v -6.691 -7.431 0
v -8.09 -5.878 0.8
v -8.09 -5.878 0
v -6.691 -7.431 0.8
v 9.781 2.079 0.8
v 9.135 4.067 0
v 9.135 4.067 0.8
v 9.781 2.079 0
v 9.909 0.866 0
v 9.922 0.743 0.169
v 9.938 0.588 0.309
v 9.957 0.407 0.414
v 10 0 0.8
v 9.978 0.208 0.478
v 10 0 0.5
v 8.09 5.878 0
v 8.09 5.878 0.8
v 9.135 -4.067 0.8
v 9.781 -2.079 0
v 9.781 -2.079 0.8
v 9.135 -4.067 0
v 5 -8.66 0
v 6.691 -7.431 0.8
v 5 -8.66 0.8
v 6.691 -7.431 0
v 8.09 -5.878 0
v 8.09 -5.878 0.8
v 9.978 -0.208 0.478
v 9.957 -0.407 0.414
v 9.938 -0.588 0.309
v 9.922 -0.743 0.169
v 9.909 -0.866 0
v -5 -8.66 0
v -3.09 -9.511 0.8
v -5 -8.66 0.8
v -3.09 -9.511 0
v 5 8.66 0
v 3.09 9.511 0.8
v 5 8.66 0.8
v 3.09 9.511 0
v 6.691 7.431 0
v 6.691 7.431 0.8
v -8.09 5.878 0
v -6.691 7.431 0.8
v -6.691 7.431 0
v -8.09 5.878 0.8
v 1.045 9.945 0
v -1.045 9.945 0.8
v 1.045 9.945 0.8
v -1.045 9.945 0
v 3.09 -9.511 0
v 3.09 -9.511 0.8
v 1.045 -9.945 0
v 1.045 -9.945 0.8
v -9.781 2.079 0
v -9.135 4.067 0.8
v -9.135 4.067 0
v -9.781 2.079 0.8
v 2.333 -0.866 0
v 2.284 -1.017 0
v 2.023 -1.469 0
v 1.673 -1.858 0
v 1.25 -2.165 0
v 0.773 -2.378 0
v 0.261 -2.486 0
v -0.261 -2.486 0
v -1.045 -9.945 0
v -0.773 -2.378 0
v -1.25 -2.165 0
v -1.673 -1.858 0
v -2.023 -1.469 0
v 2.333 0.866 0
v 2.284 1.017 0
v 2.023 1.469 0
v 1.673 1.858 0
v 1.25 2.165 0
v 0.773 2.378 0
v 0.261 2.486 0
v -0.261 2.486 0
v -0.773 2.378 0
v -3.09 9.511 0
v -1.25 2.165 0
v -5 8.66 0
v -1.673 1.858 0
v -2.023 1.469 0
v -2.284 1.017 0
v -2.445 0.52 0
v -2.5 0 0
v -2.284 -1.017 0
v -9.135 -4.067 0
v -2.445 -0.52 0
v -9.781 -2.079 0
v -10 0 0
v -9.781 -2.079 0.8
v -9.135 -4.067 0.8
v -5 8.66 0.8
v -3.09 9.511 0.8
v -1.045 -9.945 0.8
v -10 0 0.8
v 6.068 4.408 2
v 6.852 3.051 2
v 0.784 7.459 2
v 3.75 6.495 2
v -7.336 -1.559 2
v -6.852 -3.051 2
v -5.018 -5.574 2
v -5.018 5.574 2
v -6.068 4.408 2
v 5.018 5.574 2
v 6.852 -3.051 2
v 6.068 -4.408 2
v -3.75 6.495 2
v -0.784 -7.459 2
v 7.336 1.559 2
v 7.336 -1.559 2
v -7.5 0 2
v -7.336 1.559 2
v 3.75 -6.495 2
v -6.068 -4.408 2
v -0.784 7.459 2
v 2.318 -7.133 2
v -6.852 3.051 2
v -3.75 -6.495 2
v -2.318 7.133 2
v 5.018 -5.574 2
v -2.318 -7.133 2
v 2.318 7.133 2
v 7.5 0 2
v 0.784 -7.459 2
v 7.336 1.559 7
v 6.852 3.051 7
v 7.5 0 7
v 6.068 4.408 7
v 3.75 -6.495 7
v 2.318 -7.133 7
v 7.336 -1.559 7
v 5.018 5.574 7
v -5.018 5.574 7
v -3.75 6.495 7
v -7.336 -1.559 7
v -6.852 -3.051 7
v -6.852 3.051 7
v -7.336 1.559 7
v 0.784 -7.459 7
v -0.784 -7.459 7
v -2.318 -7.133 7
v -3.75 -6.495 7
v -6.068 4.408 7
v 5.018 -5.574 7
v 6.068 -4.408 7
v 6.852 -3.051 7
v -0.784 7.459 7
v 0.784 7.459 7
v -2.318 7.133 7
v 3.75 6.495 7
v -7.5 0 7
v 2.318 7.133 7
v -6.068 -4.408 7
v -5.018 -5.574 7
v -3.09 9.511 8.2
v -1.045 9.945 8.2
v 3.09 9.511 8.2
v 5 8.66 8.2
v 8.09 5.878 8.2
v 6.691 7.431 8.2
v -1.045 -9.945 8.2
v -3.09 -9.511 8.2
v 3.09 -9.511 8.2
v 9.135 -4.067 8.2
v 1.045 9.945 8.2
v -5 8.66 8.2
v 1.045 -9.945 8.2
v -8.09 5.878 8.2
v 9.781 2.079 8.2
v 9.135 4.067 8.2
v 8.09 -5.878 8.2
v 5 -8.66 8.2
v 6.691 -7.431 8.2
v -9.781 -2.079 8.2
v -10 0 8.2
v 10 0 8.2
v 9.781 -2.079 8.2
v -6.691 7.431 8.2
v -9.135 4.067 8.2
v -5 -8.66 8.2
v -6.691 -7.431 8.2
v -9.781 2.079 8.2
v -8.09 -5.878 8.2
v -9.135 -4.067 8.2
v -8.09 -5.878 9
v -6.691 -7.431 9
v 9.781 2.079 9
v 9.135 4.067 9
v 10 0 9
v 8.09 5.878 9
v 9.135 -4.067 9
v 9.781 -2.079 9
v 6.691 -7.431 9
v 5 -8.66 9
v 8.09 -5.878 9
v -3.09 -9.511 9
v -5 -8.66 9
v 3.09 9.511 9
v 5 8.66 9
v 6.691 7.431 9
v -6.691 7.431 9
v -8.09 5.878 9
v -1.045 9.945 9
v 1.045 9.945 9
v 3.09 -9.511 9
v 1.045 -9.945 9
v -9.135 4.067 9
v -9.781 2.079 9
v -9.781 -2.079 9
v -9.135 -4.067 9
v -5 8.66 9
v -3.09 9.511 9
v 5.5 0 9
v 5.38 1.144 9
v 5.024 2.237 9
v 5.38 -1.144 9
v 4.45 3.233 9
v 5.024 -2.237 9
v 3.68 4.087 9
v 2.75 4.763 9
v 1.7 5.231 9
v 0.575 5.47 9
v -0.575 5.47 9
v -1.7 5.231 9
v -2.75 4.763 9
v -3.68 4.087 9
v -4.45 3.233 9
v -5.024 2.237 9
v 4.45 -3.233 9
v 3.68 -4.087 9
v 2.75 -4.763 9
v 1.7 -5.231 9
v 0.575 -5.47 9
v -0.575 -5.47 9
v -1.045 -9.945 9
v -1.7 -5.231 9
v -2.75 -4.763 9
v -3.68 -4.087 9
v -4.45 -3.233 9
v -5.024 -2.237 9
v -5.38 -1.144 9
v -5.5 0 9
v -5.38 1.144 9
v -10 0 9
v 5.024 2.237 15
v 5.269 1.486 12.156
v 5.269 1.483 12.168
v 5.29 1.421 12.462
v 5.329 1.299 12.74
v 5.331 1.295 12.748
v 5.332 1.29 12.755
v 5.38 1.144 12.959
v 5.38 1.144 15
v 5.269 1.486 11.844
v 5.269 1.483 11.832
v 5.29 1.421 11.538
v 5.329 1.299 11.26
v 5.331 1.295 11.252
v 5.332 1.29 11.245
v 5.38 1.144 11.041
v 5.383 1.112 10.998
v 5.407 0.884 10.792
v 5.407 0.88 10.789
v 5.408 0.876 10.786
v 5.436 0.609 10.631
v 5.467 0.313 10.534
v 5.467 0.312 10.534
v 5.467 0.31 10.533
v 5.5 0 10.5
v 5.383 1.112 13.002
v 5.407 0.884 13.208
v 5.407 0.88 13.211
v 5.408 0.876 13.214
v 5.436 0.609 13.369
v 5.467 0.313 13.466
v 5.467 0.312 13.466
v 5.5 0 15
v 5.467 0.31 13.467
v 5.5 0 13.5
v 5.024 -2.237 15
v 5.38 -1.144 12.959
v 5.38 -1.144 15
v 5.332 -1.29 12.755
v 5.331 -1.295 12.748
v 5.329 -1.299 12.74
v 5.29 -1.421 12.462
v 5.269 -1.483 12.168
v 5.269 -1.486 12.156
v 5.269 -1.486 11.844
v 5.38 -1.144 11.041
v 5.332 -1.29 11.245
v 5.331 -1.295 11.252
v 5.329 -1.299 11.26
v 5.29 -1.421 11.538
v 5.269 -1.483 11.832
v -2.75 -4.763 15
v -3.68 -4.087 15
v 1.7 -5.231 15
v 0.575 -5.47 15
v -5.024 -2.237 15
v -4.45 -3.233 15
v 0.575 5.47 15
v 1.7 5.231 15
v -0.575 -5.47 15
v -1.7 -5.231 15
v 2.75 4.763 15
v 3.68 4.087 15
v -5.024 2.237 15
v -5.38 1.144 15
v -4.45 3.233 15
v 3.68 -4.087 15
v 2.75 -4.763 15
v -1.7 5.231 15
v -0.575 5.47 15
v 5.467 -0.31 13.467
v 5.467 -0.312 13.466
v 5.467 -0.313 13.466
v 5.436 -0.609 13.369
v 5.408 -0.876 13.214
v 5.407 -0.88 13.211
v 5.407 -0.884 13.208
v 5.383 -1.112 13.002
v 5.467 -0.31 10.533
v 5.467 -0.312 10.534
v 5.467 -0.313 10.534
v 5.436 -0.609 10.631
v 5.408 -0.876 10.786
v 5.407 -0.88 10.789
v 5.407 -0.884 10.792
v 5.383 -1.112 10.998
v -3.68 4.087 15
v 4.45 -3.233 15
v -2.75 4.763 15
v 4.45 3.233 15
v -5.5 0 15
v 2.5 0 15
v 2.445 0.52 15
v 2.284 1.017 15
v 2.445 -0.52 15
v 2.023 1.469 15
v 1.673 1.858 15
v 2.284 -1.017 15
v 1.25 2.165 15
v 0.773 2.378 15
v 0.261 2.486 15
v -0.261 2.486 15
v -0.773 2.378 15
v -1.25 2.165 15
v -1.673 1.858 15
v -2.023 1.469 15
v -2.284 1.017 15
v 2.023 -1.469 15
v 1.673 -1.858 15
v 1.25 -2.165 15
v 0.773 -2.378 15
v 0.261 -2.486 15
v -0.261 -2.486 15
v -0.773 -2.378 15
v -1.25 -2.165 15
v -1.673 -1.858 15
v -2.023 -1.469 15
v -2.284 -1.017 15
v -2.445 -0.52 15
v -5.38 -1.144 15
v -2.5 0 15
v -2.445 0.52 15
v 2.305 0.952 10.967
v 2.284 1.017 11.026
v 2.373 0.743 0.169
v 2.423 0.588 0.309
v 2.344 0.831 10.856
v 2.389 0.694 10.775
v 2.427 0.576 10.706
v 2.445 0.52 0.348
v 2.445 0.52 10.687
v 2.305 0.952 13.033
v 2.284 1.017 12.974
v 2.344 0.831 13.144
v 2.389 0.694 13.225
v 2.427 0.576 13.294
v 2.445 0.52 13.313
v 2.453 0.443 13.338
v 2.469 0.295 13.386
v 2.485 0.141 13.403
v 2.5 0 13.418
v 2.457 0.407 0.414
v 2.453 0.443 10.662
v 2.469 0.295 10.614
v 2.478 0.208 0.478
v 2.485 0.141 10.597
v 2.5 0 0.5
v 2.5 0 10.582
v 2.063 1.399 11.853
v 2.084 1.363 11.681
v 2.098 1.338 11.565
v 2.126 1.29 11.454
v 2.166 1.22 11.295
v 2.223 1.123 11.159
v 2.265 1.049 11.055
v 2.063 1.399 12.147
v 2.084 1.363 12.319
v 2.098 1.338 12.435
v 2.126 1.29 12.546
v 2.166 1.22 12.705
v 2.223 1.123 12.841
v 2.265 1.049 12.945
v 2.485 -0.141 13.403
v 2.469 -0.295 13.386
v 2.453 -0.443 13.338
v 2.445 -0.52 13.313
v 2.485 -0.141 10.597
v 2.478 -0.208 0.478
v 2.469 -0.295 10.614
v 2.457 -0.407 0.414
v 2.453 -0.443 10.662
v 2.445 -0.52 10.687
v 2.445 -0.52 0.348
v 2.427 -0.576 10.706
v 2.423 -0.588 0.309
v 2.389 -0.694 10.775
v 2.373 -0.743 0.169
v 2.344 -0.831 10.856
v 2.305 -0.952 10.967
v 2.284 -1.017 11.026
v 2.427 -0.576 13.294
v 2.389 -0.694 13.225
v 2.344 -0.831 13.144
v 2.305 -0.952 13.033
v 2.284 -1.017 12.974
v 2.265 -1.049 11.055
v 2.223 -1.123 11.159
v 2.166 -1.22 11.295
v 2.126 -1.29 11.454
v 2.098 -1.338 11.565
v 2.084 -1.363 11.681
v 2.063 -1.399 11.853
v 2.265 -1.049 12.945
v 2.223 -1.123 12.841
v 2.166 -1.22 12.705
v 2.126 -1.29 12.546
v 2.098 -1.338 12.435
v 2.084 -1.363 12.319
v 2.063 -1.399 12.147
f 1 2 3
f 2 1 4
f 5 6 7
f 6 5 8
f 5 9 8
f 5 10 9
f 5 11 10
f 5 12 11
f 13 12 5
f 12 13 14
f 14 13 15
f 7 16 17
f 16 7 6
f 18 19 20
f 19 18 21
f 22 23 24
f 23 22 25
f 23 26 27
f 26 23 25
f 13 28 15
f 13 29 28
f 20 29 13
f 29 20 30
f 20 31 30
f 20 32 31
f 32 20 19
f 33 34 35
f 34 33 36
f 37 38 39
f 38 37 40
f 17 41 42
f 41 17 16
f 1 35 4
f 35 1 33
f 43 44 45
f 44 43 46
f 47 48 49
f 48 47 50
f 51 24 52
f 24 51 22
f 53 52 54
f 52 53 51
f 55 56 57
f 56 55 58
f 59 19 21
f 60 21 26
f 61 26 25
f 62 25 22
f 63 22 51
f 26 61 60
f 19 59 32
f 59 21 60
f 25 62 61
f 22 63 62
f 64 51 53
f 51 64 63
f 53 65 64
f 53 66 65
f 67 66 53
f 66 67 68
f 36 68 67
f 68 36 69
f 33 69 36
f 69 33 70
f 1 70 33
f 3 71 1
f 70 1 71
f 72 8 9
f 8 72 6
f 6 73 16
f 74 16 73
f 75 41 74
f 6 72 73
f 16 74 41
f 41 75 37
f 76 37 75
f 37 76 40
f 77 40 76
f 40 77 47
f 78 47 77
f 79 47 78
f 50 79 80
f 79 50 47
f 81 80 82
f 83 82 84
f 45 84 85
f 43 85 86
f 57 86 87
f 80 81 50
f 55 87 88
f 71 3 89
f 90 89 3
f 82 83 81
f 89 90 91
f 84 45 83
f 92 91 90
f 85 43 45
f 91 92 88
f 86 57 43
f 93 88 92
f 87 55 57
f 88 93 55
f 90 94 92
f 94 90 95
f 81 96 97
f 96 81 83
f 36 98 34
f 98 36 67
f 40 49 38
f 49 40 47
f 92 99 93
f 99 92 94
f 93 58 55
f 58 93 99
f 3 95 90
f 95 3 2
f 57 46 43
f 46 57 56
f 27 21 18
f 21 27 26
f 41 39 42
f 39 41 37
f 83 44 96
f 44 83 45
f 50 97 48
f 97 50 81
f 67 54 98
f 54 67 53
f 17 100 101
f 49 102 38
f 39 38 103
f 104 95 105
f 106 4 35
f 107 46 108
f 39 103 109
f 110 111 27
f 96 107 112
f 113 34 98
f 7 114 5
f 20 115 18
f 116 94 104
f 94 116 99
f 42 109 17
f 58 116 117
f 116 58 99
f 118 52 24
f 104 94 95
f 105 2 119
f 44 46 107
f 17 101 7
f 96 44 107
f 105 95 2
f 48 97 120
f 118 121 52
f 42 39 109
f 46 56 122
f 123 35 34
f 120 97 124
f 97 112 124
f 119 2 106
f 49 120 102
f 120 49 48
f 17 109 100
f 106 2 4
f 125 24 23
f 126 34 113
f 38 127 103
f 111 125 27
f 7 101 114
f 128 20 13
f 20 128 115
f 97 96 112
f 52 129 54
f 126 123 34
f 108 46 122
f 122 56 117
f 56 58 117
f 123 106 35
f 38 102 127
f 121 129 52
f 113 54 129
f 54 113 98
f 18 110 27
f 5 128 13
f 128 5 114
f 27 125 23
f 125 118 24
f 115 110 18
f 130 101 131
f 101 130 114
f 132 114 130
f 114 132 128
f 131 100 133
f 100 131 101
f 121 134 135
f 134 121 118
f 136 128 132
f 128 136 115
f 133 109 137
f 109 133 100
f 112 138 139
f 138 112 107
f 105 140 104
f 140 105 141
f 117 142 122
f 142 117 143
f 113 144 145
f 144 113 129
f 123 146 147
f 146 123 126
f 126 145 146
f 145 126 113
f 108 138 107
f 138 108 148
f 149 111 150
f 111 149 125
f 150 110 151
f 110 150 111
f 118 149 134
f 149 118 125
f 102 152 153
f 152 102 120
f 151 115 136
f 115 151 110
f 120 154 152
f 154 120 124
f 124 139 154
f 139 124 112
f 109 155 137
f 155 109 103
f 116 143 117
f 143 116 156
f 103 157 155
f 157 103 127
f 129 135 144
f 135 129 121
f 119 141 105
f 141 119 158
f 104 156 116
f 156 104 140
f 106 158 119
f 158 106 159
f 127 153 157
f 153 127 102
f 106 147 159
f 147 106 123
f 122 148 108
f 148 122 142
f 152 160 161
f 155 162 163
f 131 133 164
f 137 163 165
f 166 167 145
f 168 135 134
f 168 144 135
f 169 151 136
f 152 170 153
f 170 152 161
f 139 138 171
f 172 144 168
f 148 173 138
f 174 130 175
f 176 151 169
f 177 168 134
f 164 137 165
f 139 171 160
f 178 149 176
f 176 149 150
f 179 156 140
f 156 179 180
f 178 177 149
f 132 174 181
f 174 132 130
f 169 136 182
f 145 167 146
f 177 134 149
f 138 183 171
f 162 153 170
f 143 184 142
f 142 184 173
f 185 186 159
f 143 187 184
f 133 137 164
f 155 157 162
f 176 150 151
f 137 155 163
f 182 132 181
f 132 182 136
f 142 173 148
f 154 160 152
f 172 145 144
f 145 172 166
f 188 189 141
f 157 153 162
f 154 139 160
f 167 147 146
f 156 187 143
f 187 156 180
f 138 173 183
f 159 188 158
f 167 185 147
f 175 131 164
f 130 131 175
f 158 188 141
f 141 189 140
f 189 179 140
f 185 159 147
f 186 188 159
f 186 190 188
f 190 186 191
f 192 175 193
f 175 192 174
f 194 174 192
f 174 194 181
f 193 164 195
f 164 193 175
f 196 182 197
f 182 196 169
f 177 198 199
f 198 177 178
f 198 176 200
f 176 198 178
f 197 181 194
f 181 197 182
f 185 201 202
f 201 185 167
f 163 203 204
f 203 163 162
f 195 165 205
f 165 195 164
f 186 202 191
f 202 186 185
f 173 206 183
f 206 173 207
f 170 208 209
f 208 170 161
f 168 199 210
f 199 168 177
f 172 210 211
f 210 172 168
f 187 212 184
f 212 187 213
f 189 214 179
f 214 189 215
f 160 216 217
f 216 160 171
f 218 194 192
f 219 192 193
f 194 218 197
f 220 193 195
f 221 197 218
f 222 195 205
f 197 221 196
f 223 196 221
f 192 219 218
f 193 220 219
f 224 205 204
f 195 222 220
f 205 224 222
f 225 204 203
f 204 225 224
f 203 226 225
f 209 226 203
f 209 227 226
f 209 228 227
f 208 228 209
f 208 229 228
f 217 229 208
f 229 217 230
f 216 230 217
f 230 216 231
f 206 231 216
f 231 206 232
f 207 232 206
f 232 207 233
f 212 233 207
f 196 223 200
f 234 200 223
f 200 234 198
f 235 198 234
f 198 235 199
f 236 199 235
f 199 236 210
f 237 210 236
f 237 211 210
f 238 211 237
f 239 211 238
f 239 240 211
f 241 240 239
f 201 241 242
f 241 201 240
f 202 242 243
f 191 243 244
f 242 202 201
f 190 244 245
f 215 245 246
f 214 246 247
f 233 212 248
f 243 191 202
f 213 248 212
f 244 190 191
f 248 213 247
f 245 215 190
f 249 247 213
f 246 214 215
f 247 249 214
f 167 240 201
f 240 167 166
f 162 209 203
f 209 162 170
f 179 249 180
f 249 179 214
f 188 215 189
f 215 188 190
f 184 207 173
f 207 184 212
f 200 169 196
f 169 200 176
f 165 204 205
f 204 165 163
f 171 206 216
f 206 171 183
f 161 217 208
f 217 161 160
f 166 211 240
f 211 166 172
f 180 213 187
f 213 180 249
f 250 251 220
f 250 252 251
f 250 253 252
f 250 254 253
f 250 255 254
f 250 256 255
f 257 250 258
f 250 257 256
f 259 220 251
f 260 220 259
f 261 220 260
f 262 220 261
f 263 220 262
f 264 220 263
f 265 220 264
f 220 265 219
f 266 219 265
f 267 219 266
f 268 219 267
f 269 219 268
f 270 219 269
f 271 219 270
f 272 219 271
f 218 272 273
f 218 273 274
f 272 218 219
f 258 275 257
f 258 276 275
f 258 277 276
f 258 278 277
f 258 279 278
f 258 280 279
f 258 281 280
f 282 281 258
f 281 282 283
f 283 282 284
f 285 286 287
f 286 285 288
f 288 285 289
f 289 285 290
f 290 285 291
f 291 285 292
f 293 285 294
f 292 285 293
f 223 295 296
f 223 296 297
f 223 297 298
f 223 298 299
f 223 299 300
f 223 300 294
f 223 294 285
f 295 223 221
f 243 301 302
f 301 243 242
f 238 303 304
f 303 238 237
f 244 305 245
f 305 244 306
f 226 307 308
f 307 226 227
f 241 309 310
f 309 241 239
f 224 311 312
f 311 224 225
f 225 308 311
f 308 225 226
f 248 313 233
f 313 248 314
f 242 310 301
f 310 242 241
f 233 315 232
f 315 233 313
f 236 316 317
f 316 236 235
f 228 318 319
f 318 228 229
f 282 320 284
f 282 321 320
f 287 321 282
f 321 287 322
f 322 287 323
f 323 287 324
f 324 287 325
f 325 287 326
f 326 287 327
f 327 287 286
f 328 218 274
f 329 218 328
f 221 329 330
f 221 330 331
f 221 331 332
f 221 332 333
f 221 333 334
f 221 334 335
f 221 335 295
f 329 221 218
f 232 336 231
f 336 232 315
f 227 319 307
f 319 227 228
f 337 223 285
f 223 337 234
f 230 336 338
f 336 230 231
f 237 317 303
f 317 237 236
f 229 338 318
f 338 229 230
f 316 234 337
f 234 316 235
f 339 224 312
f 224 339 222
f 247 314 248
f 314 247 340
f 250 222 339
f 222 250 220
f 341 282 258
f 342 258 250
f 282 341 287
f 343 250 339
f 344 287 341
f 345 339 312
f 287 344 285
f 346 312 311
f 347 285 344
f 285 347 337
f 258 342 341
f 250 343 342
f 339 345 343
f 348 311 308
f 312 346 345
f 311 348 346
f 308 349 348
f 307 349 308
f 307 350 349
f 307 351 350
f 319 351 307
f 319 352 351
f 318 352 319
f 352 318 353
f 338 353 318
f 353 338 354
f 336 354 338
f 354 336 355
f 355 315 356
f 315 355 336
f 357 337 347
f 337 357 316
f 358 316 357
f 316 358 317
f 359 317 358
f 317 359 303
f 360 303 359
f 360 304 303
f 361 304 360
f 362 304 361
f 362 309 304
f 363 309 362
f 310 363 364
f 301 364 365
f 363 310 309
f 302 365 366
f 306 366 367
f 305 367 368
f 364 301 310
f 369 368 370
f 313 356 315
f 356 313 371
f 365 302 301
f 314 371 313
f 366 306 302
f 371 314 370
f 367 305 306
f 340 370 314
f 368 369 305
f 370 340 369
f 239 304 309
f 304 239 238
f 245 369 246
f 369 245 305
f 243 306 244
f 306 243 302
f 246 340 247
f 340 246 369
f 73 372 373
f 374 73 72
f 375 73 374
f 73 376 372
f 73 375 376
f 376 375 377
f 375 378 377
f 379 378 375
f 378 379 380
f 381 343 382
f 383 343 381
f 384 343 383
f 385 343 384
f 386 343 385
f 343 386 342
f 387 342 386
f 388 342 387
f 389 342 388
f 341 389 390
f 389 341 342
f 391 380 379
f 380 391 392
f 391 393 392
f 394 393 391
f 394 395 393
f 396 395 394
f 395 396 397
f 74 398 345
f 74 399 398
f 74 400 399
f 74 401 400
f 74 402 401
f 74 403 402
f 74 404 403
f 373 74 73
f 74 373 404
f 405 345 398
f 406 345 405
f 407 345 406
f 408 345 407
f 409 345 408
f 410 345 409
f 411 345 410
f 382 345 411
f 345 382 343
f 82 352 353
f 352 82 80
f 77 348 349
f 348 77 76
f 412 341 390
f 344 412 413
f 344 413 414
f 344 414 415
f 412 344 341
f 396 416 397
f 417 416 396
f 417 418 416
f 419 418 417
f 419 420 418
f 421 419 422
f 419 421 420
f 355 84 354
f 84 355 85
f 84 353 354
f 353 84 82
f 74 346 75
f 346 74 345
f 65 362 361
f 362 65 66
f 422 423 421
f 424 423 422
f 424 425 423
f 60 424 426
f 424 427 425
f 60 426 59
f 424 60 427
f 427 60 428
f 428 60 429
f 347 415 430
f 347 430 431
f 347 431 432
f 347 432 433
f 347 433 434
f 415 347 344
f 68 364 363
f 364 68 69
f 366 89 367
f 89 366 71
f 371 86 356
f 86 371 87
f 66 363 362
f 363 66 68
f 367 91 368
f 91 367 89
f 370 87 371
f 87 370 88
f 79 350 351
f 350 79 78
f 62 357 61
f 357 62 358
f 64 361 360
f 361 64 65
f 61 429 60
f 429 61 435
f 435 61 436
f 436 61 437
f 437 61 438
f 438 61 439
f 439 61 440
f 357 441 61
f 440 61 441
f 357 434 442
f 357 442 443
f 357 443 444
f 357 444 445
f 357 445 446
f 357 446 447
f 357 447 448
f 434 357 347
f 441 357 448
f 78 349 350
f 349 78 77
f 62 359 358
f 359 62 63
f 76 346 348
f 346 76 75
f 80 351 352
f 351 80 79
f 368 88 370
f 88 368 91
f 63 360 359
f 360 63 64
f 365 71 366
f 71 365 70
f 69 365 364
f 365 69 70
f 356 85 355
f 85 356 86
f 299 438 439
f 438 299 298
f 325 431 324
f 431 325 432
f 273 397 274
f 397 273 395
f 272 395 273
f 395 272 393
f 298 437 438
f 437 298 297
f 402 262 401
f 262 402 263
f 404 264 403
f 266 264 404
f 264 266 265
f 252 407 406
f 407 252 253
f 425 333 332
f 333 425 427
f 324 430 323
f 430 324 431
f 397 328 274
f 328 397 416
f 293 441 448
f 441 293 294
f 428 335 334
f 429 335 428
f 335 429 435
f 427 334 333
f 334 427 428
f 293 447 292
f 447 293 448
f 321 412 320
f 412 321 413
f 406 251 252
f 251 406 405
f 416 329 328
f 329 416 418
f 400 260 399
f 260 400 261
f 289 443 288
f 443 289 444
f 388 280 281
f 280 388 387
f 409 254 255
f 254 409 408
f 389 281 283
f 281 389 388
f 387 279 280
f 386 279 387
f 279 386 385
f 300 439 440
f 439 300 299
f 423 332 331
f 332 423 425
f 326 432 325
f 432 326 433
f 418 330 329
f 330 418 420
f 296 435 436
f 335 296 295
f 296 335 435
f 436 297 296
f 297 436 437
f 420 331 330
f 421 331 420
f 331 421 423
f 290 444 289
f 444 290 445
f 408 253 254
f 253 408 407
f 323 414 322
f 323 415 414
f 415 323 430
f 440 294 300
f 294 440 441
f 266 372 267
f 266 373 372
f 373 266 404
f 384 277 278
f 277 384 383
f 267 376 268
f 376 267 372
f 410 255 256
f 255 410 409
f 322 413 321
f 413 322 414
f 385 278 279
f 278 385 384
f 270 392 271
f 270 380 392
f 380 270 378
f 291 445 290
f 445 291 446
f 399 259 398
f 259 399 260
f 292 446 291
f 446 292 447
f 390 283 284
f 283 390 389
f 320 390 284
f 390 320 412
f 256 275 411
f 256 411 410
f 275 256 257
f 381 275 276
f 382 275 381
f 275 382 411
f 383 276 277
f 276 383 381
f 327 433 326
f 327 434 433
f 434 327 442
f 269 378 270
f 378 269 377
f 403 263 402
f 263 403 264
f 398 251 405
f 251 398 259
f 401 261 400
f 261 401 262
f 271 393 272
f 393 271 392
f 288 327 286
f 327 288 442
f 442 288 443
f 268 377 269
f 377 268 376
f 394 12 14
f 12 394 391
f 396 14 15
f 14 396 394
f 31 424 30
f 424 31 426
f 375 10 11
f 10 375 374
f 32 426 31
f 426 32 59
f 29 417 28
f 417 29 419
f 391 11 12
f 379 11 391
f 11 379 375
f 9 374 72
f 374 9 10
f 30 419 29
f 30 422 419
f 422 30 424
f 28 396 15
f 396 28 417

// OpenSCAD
/* [Global] */

// Motor Axis diameter
mr=5;

// Motor screw diameter
screw=3;

// Inner diameter
idi=15;

// Outer diamerer
odi=20;

// inner width
iw=5;

// outer width
ow=2;

// rotaion marker
marker=1; // [0,1]

/* [Hidden] */

$fs = 0.05;

difference(){
  difference(){
    difference(){
      union(){
        cylinder(ow*0.4,odi/2,odi/2);
        translate([0,0,ow*0.4]) cylinder(ow*0.6,odi/2,idi/2);
        translate([0,0,ow]) cylinder(iw,idi/2,idi/2);
        translate([0,0,ow+iw]) cylinder(ow*0.60,idi/2,odi/2);
        translate([0,0,ow+iw+ow*0.60]) cylinder(ow*0.40,odi/2,odi/2);
        translate([0,0,2*ow+iw]) cylinder(2*screw ,mr/2+screw,mr/2+screw);
      }
      // Motor Axis
      translate([0,0,-0.5])
      cylinder(2*ow+iw+2*screw+1,mr/2,mr/2);
    }
    // Screw hole
    translate([0,0,2*ow+iw+screw])
    rotate([0,90,0])
    cylinder(mr/2+screw, screw/2*0.9, screw/2);
  }

  // Marker
  if (marker==1) {
    translate([0,0,-ow*0.25])
    rotate([0,90,0])
    cylinder(odi/2+0.5,odi/20,odi/20);
  }
}
